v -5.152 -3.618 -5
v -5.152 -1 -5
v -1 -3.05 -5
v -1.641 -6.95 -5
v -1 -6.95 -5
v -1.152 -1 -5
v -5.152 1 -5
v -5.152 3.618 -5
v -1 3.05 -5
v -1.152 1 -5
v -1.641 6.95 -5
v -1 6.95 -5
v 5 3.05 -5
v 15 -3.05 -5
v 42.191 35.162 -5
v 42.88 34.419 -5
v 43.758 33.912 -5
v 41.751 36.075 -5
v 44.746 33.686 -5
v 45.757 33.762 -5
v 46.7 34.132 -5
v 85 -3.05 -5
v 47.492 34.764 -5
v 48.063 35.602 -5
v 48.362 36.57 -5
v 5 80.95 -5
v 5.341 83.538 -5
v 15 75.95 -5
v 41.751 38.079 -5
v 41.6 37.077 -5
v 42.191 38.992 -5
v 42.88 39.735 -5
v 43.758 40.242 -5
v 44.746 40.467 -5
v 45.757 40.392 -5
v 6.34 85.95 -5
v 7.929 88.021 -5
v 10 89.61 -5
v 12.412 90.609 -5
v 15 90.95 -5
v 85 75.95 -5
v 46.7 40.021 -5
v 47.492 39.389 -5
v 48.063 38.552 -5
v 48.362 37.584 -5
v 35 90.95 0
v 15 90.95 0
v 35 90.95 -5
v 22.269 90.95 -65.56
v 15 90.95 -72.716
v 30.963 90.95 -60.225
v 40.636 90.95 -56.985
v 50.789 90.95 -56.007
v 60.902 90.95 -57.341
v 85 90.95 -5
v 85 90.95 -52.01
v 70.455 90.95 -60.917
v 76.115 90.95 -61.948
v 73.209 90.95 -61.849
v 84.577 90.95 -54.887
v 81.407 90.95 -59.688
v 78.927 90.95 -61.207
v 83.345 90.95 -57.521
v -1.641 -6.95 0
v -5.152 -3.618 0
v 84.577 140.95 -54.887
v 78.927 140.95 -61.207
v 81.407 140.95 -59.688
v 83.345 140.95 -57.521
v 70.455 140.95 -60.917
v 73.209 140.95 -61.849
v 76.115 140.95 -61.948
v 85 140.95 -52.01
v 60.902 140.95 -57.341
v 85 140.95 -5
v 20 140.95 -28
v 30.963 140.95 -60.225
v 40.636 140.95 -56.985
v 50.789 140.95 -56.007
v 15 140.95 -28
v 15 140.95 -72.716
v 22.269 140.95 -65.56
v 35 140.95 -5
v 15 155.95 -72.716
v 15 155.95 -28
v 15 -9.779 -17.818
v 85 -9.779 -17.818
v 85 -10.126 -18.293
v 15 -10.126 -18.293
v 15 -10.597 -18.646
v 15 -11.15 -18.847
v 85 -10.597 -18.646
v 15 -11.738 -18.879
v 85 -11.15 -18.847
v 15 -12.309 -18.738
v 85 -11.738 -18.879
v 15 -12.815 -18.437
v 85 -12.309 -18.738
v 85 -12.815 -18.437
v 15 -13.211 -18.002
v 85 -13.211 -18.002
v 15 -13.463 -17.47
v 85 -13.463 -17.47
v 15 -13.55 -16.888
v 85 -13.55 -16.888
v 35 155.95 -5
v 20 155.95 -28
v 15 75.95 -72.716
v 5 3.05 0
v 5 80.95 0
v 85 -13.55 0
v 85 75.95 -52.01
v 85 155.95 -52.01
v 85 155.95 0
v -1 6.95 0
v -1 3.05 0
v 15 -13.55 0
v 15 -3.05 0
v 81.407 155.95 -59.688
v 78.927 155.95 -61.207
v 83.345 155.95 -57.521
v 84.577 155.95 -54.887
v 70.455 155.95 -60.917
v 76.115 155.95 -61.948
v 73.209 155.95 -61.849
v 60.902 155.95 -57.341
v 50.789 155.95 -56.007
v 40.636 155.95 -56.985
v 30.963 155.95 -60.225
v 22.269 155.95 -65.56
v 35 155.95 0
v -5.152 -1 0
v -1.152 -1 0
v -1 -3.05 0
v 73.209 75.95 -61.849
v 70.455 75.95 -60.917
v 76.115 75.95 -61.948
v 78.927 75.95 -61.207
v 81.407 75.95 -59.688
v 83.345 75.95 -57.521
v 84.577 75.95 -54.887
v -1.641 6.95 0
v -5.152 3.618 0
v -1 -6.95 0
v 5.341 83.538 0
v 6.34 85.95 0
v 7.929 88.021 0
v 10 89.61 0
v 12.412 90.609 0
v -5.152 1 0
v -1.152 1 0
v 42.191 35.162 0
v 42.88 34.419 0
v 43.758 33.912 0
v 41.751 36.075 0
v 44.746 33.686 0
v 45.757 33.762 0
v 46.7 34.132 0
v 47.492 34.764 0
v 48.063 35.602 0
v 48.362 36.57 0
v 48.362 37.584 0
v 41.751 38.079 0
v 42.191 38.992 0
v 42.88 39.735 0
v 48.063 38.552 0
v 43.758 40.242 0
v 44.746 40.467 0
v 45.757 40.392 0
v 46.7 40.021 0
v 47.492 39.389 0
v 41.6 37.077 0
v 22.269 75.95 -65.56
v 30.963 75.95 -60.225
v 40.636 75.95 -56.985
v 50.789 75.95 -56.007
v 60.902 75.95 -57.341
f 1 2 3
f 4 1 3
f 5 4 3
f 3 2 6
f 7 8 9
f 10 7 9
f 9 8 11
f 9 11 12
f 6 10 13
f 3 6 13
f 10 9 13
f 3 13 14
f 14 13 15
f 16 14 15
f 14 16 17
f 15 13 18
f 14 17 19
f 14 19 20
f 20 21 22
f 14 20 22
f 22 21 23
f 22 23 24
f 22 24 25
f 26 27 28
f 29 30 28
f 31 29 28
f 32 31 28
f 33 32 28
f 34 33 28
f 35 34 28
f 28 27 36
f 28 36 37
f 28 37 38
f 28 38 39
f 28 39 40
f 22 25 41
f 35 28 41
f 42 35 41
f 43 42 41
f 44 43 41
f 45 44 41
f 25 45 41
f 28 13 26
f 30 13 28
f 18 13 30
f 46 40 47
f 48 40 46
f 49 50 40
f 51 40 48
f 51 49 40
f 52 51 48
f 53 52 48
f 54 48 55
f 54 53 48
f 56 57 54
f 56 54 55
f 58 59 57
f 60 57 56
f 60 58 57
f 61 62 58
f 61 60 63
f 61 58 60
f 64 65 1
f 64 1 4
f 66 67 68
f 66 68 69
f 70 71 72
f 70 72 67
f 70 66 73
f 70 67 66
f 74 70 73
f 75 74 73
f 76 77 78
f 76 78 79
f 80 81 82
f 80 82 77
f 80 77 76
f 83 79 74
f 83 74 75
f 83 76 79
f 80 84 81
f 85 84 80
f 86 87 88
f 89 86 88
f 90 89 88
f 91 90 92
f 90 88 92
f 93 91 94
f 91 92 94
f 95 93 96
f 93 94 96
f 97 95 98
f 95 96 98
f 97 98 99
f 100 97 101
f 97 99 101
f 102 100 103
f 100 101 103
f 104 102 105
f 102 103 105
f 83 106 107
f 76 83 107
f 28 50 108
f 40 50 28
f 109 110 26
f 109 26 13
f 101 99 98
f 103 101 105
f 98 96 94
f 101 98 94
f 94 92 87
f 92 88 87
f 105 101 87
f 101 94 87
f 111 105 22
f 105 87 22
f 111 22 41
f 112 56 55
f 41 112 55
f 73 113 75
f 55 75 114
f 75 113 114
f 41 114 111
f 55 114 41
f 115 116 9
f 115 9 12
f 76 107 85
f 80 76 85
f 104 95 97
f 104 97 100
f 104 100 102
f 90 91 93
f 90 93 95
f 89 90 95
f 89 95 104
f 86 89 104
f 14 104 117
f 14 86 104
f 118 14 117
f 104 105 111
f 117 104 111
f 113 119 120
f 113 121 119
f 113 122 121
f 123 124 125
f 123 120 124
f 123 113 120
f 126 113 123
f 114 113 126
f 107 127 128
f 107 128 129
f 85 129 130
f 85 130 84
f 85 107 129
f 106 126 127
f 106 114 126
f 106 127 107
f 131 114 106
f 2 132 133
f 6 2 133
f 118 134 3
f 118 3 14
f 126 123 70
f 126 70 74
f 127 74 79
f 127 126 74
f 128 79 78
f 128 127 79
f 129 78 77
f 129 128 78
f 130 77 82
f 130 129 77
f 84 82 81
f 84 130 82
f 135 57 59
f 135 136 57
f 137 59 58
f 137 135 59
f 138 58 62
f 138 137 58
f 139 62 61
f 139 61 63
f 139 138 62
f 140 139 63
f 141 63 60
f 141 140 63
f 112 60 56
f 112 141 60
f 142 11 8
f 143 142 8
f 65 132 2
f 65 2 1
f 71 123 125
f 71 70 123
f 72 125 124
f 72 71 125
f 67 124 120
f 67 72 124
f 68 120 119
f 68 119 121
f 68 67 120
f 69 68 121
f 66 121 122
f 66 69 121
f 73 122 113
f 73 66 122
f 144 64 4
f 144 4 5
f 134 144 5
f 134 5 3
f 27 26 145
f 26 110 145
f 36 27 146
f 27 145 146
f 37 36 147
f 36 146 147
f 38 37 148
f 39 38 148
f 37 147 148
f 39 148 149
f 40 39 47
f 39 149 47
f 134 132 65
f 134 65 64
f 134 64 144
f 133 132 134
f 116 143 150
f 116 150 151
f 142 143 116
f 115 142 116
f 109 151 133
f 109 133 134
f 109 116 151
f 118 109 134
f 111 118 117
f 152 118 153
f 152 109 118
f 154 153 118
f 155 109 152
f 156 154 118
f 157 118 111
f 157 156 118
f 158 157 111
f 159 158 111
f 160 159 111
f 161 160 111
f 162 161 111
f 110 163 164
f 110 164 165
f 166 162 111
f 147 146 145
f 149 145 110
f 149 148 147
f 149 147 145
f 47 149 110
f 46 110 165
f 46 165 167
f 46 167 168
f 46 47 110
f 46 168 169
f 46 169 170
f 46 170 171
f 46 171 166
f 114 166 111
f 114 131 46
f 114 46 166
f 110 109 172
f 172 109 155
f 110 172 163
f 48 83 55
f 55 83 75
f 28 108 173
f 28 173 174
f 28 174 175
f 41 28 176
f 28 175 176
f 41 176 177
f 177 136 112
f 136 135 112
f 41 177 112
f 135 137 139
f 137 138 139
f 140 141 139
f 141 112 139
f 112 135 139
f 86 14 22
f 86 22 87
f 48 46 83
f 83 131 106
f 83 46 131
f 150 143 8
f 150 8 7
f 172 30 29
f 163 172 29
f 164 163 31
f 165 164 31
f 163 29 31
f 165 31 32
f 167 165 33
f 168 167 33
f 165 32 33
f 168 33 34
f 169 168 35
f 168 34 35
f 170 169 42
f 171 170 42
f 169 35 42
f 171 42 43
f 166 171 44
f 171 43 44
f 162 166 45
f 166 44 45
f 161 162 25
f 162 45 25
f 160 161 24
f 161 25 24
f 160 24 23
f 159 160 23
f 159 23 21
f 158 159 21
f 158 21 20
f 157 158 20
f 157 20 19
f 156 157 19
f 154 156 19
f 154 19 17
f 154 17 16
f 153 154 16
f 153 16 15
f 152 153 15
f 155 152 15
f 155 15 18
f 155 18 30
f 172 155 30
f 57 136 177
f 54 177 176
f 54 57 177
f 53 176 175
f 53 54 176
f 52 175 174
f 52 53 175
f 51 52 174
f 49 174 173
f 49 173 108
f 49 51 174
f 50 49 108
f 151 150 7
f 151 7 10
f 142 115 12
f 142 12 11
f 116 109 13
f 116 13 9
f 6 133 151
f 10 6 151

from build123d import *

# Parameters (mm, degrees)
BOSS_EXTRUDE1_DEPTH = 5
BOSS_EXTRUDE2_DEPTH = 80
SKETCH4_W           = 4
SKETCH4_H           = 2
CUT_EXTRUDE1_DEPTH  = 73.715728753
SKETCH5_W           = 67.715728753
SKETCH5_H           = 50
CUT_EXTRUDE2_DEPTH  = 81
CUT_EXTRUDE3_DEPTH  = 65
SKETCH7_W           = 80
SKETCH7_H           = 5
BOSS_EXTRUDE3_DEPTH = 10.5
BOSS_EXTRUDE4_DEPTH = 80
FILLET1_R           = 2
FILLET2_R           = 10
CUT_EXTRUDE4_DEPTH  = 170.5
FILLET3_R           = 10
SKETCH10_R          = 3.4
CUT_EXTRUDE5_DEPTH  = 6


with BuildPart() as part:
    # Sketch2 → Boss-Extrude1 (new body)
    with BuildSketch(Plane.XY):
        Polygon((-5.152414984, 3.618325464), (-5.152414984, -3.618325464), (-1.641080211, -6.95), (-1, -6.95), (-1, -3.05), (95, -3.05), (95, 155.95), (5, 155.95), (5, 3.05), (-1, 3.05), (-1, 6.95), (-1.641080211, 6.95), align=None)
    extrude(amount=-BOSS_EXTRUDE1_DEPTH)

    # Sketch3 → Boss-Extrude2 (add)
    with BuildSketch(Plane(origin=(0, 155.95, 0), x_dir=(1, 0, 0), z_dir=(0, 1, 0))):
        with BuildLine():
            ThreePointArc((85, 72.715728753), (50, 56), (15, 72.715728753))
            Line((15, 72.715728753), (15, 5))
            Line((15, 5), (85, 5))
            Line((85, 5), (85, 72.715728753))
        make_face()
    extrude(amount=-BOSS_EXTRUDE2_DEPTH)

    # Sketch4 → Cut-Extrude1 (cut, through all)
    with BuildSketch(Plane.XY):
        with Locations((-3.152414984, 0)):
            Rectangle(SKETCH4_W, SKETCH4_H)
    extrude(amount=-CUT_EXTRUDE1_DEPTH, mode=Mode.SUBTRACT)

    # Sketch5 → Cut-Extrude2 (cut, through all)
    with BuildSketch(Plane.ZY.offset(-15)):
        with Locations((-38.857864377, 115.95)):
            Rectangle(SKETCH5_W, SKETCH5_H)
    extrude(amount=-CUT_EXTRUDE2_DEPTH, mode=Mode.SUBTRACT)

    # Sketch6 → Cut-Extrude3 (cut)
    with BuildSketch(Plane(origin=(0, 155.95, 0), x_dir=(1, 0, 0), z_dir=(0, 1, 0))):
        Polygon((35, 0), (35, 5), (20, 28), (15, 28), (15, 5), (5, 5), (5, 0), align=None)
    extrude(amount=-CUT_EXTRUDE3_DEPTH, mode=Mode.SUBTRACT)

    # Sketch7 → Boss-Extrude3 (add)
    with BuildSketch(Plane.XZ.offset(3.05)):
        with Locations((55, -2.5)):
            Rectangle(SKETCH7_W, SKETCH7_H)
    extrude(amount=BOSS_EXTRUDE3_DEPTH)

    # Sketch8 → Boss-Extrude4 (add)
    with BuildSketch(Plane.ZY.offset(-15)):
        Polygon((-5, -3.05), (-25, -13.55), (-5, -13.55), align=None)
    extrude(amount=-BOSS_EXTRUDE4_DEPTH)

    # Fillet1
    fillet1_edges = [part.edges().sort_by_distance(p)[0] for p in [
        (55, -13.55, -25),
    ]]
    fillet(fillet1_edges, radius=FILLET1_R)

    # Fillet2
    fillet2_edges = [part.edges().sort_by_distance(p)[0] for p in [
        (5, 90.95, -2.5),
    ]]
    fillet(fillet2_edges, radius=FILLET2_R)

    # Sketch9 → Cut-Extrude4 (cut, through all)
    with BuildSketch(Plane(origin=(0, 155.95, 0), x_dir=(1, 0, 0), z_dir=(0, 1, 0))):
        Polygon((85, 5), (85, 0), (95, 0), (95, 72.715728753), (85, 72.715728753), align=None)
    extrude(amount=-CUT_EXTRUDE4_DEPTH, mode=Mode.SUBTRACT)

    # Fillet3
    fillet3_edges = [part.edges().sort_by_distance(p)[0] for p in [
        (85, 83.45, -72.715728753),
        (85, 148.45, -72.715728753),
    ]]
    fillet(fillet3_edges, radius=FILLET3_R)

    # Sketch10 → Cut-Extrude5 (cut, through all)
    with BuildSketch(Plane(origin=(0, 0, -5), x_dir=(-1, 0, 0), z_dir=(0, 0, -1))):
        with Locations((-45, 37.07686976)):
            Circle(SKETCH10_R)
    extrude(amount=-CUT_EXTRUDE5_DEPTH, mode=Mode.SUBTRACT)


solid = part.part
